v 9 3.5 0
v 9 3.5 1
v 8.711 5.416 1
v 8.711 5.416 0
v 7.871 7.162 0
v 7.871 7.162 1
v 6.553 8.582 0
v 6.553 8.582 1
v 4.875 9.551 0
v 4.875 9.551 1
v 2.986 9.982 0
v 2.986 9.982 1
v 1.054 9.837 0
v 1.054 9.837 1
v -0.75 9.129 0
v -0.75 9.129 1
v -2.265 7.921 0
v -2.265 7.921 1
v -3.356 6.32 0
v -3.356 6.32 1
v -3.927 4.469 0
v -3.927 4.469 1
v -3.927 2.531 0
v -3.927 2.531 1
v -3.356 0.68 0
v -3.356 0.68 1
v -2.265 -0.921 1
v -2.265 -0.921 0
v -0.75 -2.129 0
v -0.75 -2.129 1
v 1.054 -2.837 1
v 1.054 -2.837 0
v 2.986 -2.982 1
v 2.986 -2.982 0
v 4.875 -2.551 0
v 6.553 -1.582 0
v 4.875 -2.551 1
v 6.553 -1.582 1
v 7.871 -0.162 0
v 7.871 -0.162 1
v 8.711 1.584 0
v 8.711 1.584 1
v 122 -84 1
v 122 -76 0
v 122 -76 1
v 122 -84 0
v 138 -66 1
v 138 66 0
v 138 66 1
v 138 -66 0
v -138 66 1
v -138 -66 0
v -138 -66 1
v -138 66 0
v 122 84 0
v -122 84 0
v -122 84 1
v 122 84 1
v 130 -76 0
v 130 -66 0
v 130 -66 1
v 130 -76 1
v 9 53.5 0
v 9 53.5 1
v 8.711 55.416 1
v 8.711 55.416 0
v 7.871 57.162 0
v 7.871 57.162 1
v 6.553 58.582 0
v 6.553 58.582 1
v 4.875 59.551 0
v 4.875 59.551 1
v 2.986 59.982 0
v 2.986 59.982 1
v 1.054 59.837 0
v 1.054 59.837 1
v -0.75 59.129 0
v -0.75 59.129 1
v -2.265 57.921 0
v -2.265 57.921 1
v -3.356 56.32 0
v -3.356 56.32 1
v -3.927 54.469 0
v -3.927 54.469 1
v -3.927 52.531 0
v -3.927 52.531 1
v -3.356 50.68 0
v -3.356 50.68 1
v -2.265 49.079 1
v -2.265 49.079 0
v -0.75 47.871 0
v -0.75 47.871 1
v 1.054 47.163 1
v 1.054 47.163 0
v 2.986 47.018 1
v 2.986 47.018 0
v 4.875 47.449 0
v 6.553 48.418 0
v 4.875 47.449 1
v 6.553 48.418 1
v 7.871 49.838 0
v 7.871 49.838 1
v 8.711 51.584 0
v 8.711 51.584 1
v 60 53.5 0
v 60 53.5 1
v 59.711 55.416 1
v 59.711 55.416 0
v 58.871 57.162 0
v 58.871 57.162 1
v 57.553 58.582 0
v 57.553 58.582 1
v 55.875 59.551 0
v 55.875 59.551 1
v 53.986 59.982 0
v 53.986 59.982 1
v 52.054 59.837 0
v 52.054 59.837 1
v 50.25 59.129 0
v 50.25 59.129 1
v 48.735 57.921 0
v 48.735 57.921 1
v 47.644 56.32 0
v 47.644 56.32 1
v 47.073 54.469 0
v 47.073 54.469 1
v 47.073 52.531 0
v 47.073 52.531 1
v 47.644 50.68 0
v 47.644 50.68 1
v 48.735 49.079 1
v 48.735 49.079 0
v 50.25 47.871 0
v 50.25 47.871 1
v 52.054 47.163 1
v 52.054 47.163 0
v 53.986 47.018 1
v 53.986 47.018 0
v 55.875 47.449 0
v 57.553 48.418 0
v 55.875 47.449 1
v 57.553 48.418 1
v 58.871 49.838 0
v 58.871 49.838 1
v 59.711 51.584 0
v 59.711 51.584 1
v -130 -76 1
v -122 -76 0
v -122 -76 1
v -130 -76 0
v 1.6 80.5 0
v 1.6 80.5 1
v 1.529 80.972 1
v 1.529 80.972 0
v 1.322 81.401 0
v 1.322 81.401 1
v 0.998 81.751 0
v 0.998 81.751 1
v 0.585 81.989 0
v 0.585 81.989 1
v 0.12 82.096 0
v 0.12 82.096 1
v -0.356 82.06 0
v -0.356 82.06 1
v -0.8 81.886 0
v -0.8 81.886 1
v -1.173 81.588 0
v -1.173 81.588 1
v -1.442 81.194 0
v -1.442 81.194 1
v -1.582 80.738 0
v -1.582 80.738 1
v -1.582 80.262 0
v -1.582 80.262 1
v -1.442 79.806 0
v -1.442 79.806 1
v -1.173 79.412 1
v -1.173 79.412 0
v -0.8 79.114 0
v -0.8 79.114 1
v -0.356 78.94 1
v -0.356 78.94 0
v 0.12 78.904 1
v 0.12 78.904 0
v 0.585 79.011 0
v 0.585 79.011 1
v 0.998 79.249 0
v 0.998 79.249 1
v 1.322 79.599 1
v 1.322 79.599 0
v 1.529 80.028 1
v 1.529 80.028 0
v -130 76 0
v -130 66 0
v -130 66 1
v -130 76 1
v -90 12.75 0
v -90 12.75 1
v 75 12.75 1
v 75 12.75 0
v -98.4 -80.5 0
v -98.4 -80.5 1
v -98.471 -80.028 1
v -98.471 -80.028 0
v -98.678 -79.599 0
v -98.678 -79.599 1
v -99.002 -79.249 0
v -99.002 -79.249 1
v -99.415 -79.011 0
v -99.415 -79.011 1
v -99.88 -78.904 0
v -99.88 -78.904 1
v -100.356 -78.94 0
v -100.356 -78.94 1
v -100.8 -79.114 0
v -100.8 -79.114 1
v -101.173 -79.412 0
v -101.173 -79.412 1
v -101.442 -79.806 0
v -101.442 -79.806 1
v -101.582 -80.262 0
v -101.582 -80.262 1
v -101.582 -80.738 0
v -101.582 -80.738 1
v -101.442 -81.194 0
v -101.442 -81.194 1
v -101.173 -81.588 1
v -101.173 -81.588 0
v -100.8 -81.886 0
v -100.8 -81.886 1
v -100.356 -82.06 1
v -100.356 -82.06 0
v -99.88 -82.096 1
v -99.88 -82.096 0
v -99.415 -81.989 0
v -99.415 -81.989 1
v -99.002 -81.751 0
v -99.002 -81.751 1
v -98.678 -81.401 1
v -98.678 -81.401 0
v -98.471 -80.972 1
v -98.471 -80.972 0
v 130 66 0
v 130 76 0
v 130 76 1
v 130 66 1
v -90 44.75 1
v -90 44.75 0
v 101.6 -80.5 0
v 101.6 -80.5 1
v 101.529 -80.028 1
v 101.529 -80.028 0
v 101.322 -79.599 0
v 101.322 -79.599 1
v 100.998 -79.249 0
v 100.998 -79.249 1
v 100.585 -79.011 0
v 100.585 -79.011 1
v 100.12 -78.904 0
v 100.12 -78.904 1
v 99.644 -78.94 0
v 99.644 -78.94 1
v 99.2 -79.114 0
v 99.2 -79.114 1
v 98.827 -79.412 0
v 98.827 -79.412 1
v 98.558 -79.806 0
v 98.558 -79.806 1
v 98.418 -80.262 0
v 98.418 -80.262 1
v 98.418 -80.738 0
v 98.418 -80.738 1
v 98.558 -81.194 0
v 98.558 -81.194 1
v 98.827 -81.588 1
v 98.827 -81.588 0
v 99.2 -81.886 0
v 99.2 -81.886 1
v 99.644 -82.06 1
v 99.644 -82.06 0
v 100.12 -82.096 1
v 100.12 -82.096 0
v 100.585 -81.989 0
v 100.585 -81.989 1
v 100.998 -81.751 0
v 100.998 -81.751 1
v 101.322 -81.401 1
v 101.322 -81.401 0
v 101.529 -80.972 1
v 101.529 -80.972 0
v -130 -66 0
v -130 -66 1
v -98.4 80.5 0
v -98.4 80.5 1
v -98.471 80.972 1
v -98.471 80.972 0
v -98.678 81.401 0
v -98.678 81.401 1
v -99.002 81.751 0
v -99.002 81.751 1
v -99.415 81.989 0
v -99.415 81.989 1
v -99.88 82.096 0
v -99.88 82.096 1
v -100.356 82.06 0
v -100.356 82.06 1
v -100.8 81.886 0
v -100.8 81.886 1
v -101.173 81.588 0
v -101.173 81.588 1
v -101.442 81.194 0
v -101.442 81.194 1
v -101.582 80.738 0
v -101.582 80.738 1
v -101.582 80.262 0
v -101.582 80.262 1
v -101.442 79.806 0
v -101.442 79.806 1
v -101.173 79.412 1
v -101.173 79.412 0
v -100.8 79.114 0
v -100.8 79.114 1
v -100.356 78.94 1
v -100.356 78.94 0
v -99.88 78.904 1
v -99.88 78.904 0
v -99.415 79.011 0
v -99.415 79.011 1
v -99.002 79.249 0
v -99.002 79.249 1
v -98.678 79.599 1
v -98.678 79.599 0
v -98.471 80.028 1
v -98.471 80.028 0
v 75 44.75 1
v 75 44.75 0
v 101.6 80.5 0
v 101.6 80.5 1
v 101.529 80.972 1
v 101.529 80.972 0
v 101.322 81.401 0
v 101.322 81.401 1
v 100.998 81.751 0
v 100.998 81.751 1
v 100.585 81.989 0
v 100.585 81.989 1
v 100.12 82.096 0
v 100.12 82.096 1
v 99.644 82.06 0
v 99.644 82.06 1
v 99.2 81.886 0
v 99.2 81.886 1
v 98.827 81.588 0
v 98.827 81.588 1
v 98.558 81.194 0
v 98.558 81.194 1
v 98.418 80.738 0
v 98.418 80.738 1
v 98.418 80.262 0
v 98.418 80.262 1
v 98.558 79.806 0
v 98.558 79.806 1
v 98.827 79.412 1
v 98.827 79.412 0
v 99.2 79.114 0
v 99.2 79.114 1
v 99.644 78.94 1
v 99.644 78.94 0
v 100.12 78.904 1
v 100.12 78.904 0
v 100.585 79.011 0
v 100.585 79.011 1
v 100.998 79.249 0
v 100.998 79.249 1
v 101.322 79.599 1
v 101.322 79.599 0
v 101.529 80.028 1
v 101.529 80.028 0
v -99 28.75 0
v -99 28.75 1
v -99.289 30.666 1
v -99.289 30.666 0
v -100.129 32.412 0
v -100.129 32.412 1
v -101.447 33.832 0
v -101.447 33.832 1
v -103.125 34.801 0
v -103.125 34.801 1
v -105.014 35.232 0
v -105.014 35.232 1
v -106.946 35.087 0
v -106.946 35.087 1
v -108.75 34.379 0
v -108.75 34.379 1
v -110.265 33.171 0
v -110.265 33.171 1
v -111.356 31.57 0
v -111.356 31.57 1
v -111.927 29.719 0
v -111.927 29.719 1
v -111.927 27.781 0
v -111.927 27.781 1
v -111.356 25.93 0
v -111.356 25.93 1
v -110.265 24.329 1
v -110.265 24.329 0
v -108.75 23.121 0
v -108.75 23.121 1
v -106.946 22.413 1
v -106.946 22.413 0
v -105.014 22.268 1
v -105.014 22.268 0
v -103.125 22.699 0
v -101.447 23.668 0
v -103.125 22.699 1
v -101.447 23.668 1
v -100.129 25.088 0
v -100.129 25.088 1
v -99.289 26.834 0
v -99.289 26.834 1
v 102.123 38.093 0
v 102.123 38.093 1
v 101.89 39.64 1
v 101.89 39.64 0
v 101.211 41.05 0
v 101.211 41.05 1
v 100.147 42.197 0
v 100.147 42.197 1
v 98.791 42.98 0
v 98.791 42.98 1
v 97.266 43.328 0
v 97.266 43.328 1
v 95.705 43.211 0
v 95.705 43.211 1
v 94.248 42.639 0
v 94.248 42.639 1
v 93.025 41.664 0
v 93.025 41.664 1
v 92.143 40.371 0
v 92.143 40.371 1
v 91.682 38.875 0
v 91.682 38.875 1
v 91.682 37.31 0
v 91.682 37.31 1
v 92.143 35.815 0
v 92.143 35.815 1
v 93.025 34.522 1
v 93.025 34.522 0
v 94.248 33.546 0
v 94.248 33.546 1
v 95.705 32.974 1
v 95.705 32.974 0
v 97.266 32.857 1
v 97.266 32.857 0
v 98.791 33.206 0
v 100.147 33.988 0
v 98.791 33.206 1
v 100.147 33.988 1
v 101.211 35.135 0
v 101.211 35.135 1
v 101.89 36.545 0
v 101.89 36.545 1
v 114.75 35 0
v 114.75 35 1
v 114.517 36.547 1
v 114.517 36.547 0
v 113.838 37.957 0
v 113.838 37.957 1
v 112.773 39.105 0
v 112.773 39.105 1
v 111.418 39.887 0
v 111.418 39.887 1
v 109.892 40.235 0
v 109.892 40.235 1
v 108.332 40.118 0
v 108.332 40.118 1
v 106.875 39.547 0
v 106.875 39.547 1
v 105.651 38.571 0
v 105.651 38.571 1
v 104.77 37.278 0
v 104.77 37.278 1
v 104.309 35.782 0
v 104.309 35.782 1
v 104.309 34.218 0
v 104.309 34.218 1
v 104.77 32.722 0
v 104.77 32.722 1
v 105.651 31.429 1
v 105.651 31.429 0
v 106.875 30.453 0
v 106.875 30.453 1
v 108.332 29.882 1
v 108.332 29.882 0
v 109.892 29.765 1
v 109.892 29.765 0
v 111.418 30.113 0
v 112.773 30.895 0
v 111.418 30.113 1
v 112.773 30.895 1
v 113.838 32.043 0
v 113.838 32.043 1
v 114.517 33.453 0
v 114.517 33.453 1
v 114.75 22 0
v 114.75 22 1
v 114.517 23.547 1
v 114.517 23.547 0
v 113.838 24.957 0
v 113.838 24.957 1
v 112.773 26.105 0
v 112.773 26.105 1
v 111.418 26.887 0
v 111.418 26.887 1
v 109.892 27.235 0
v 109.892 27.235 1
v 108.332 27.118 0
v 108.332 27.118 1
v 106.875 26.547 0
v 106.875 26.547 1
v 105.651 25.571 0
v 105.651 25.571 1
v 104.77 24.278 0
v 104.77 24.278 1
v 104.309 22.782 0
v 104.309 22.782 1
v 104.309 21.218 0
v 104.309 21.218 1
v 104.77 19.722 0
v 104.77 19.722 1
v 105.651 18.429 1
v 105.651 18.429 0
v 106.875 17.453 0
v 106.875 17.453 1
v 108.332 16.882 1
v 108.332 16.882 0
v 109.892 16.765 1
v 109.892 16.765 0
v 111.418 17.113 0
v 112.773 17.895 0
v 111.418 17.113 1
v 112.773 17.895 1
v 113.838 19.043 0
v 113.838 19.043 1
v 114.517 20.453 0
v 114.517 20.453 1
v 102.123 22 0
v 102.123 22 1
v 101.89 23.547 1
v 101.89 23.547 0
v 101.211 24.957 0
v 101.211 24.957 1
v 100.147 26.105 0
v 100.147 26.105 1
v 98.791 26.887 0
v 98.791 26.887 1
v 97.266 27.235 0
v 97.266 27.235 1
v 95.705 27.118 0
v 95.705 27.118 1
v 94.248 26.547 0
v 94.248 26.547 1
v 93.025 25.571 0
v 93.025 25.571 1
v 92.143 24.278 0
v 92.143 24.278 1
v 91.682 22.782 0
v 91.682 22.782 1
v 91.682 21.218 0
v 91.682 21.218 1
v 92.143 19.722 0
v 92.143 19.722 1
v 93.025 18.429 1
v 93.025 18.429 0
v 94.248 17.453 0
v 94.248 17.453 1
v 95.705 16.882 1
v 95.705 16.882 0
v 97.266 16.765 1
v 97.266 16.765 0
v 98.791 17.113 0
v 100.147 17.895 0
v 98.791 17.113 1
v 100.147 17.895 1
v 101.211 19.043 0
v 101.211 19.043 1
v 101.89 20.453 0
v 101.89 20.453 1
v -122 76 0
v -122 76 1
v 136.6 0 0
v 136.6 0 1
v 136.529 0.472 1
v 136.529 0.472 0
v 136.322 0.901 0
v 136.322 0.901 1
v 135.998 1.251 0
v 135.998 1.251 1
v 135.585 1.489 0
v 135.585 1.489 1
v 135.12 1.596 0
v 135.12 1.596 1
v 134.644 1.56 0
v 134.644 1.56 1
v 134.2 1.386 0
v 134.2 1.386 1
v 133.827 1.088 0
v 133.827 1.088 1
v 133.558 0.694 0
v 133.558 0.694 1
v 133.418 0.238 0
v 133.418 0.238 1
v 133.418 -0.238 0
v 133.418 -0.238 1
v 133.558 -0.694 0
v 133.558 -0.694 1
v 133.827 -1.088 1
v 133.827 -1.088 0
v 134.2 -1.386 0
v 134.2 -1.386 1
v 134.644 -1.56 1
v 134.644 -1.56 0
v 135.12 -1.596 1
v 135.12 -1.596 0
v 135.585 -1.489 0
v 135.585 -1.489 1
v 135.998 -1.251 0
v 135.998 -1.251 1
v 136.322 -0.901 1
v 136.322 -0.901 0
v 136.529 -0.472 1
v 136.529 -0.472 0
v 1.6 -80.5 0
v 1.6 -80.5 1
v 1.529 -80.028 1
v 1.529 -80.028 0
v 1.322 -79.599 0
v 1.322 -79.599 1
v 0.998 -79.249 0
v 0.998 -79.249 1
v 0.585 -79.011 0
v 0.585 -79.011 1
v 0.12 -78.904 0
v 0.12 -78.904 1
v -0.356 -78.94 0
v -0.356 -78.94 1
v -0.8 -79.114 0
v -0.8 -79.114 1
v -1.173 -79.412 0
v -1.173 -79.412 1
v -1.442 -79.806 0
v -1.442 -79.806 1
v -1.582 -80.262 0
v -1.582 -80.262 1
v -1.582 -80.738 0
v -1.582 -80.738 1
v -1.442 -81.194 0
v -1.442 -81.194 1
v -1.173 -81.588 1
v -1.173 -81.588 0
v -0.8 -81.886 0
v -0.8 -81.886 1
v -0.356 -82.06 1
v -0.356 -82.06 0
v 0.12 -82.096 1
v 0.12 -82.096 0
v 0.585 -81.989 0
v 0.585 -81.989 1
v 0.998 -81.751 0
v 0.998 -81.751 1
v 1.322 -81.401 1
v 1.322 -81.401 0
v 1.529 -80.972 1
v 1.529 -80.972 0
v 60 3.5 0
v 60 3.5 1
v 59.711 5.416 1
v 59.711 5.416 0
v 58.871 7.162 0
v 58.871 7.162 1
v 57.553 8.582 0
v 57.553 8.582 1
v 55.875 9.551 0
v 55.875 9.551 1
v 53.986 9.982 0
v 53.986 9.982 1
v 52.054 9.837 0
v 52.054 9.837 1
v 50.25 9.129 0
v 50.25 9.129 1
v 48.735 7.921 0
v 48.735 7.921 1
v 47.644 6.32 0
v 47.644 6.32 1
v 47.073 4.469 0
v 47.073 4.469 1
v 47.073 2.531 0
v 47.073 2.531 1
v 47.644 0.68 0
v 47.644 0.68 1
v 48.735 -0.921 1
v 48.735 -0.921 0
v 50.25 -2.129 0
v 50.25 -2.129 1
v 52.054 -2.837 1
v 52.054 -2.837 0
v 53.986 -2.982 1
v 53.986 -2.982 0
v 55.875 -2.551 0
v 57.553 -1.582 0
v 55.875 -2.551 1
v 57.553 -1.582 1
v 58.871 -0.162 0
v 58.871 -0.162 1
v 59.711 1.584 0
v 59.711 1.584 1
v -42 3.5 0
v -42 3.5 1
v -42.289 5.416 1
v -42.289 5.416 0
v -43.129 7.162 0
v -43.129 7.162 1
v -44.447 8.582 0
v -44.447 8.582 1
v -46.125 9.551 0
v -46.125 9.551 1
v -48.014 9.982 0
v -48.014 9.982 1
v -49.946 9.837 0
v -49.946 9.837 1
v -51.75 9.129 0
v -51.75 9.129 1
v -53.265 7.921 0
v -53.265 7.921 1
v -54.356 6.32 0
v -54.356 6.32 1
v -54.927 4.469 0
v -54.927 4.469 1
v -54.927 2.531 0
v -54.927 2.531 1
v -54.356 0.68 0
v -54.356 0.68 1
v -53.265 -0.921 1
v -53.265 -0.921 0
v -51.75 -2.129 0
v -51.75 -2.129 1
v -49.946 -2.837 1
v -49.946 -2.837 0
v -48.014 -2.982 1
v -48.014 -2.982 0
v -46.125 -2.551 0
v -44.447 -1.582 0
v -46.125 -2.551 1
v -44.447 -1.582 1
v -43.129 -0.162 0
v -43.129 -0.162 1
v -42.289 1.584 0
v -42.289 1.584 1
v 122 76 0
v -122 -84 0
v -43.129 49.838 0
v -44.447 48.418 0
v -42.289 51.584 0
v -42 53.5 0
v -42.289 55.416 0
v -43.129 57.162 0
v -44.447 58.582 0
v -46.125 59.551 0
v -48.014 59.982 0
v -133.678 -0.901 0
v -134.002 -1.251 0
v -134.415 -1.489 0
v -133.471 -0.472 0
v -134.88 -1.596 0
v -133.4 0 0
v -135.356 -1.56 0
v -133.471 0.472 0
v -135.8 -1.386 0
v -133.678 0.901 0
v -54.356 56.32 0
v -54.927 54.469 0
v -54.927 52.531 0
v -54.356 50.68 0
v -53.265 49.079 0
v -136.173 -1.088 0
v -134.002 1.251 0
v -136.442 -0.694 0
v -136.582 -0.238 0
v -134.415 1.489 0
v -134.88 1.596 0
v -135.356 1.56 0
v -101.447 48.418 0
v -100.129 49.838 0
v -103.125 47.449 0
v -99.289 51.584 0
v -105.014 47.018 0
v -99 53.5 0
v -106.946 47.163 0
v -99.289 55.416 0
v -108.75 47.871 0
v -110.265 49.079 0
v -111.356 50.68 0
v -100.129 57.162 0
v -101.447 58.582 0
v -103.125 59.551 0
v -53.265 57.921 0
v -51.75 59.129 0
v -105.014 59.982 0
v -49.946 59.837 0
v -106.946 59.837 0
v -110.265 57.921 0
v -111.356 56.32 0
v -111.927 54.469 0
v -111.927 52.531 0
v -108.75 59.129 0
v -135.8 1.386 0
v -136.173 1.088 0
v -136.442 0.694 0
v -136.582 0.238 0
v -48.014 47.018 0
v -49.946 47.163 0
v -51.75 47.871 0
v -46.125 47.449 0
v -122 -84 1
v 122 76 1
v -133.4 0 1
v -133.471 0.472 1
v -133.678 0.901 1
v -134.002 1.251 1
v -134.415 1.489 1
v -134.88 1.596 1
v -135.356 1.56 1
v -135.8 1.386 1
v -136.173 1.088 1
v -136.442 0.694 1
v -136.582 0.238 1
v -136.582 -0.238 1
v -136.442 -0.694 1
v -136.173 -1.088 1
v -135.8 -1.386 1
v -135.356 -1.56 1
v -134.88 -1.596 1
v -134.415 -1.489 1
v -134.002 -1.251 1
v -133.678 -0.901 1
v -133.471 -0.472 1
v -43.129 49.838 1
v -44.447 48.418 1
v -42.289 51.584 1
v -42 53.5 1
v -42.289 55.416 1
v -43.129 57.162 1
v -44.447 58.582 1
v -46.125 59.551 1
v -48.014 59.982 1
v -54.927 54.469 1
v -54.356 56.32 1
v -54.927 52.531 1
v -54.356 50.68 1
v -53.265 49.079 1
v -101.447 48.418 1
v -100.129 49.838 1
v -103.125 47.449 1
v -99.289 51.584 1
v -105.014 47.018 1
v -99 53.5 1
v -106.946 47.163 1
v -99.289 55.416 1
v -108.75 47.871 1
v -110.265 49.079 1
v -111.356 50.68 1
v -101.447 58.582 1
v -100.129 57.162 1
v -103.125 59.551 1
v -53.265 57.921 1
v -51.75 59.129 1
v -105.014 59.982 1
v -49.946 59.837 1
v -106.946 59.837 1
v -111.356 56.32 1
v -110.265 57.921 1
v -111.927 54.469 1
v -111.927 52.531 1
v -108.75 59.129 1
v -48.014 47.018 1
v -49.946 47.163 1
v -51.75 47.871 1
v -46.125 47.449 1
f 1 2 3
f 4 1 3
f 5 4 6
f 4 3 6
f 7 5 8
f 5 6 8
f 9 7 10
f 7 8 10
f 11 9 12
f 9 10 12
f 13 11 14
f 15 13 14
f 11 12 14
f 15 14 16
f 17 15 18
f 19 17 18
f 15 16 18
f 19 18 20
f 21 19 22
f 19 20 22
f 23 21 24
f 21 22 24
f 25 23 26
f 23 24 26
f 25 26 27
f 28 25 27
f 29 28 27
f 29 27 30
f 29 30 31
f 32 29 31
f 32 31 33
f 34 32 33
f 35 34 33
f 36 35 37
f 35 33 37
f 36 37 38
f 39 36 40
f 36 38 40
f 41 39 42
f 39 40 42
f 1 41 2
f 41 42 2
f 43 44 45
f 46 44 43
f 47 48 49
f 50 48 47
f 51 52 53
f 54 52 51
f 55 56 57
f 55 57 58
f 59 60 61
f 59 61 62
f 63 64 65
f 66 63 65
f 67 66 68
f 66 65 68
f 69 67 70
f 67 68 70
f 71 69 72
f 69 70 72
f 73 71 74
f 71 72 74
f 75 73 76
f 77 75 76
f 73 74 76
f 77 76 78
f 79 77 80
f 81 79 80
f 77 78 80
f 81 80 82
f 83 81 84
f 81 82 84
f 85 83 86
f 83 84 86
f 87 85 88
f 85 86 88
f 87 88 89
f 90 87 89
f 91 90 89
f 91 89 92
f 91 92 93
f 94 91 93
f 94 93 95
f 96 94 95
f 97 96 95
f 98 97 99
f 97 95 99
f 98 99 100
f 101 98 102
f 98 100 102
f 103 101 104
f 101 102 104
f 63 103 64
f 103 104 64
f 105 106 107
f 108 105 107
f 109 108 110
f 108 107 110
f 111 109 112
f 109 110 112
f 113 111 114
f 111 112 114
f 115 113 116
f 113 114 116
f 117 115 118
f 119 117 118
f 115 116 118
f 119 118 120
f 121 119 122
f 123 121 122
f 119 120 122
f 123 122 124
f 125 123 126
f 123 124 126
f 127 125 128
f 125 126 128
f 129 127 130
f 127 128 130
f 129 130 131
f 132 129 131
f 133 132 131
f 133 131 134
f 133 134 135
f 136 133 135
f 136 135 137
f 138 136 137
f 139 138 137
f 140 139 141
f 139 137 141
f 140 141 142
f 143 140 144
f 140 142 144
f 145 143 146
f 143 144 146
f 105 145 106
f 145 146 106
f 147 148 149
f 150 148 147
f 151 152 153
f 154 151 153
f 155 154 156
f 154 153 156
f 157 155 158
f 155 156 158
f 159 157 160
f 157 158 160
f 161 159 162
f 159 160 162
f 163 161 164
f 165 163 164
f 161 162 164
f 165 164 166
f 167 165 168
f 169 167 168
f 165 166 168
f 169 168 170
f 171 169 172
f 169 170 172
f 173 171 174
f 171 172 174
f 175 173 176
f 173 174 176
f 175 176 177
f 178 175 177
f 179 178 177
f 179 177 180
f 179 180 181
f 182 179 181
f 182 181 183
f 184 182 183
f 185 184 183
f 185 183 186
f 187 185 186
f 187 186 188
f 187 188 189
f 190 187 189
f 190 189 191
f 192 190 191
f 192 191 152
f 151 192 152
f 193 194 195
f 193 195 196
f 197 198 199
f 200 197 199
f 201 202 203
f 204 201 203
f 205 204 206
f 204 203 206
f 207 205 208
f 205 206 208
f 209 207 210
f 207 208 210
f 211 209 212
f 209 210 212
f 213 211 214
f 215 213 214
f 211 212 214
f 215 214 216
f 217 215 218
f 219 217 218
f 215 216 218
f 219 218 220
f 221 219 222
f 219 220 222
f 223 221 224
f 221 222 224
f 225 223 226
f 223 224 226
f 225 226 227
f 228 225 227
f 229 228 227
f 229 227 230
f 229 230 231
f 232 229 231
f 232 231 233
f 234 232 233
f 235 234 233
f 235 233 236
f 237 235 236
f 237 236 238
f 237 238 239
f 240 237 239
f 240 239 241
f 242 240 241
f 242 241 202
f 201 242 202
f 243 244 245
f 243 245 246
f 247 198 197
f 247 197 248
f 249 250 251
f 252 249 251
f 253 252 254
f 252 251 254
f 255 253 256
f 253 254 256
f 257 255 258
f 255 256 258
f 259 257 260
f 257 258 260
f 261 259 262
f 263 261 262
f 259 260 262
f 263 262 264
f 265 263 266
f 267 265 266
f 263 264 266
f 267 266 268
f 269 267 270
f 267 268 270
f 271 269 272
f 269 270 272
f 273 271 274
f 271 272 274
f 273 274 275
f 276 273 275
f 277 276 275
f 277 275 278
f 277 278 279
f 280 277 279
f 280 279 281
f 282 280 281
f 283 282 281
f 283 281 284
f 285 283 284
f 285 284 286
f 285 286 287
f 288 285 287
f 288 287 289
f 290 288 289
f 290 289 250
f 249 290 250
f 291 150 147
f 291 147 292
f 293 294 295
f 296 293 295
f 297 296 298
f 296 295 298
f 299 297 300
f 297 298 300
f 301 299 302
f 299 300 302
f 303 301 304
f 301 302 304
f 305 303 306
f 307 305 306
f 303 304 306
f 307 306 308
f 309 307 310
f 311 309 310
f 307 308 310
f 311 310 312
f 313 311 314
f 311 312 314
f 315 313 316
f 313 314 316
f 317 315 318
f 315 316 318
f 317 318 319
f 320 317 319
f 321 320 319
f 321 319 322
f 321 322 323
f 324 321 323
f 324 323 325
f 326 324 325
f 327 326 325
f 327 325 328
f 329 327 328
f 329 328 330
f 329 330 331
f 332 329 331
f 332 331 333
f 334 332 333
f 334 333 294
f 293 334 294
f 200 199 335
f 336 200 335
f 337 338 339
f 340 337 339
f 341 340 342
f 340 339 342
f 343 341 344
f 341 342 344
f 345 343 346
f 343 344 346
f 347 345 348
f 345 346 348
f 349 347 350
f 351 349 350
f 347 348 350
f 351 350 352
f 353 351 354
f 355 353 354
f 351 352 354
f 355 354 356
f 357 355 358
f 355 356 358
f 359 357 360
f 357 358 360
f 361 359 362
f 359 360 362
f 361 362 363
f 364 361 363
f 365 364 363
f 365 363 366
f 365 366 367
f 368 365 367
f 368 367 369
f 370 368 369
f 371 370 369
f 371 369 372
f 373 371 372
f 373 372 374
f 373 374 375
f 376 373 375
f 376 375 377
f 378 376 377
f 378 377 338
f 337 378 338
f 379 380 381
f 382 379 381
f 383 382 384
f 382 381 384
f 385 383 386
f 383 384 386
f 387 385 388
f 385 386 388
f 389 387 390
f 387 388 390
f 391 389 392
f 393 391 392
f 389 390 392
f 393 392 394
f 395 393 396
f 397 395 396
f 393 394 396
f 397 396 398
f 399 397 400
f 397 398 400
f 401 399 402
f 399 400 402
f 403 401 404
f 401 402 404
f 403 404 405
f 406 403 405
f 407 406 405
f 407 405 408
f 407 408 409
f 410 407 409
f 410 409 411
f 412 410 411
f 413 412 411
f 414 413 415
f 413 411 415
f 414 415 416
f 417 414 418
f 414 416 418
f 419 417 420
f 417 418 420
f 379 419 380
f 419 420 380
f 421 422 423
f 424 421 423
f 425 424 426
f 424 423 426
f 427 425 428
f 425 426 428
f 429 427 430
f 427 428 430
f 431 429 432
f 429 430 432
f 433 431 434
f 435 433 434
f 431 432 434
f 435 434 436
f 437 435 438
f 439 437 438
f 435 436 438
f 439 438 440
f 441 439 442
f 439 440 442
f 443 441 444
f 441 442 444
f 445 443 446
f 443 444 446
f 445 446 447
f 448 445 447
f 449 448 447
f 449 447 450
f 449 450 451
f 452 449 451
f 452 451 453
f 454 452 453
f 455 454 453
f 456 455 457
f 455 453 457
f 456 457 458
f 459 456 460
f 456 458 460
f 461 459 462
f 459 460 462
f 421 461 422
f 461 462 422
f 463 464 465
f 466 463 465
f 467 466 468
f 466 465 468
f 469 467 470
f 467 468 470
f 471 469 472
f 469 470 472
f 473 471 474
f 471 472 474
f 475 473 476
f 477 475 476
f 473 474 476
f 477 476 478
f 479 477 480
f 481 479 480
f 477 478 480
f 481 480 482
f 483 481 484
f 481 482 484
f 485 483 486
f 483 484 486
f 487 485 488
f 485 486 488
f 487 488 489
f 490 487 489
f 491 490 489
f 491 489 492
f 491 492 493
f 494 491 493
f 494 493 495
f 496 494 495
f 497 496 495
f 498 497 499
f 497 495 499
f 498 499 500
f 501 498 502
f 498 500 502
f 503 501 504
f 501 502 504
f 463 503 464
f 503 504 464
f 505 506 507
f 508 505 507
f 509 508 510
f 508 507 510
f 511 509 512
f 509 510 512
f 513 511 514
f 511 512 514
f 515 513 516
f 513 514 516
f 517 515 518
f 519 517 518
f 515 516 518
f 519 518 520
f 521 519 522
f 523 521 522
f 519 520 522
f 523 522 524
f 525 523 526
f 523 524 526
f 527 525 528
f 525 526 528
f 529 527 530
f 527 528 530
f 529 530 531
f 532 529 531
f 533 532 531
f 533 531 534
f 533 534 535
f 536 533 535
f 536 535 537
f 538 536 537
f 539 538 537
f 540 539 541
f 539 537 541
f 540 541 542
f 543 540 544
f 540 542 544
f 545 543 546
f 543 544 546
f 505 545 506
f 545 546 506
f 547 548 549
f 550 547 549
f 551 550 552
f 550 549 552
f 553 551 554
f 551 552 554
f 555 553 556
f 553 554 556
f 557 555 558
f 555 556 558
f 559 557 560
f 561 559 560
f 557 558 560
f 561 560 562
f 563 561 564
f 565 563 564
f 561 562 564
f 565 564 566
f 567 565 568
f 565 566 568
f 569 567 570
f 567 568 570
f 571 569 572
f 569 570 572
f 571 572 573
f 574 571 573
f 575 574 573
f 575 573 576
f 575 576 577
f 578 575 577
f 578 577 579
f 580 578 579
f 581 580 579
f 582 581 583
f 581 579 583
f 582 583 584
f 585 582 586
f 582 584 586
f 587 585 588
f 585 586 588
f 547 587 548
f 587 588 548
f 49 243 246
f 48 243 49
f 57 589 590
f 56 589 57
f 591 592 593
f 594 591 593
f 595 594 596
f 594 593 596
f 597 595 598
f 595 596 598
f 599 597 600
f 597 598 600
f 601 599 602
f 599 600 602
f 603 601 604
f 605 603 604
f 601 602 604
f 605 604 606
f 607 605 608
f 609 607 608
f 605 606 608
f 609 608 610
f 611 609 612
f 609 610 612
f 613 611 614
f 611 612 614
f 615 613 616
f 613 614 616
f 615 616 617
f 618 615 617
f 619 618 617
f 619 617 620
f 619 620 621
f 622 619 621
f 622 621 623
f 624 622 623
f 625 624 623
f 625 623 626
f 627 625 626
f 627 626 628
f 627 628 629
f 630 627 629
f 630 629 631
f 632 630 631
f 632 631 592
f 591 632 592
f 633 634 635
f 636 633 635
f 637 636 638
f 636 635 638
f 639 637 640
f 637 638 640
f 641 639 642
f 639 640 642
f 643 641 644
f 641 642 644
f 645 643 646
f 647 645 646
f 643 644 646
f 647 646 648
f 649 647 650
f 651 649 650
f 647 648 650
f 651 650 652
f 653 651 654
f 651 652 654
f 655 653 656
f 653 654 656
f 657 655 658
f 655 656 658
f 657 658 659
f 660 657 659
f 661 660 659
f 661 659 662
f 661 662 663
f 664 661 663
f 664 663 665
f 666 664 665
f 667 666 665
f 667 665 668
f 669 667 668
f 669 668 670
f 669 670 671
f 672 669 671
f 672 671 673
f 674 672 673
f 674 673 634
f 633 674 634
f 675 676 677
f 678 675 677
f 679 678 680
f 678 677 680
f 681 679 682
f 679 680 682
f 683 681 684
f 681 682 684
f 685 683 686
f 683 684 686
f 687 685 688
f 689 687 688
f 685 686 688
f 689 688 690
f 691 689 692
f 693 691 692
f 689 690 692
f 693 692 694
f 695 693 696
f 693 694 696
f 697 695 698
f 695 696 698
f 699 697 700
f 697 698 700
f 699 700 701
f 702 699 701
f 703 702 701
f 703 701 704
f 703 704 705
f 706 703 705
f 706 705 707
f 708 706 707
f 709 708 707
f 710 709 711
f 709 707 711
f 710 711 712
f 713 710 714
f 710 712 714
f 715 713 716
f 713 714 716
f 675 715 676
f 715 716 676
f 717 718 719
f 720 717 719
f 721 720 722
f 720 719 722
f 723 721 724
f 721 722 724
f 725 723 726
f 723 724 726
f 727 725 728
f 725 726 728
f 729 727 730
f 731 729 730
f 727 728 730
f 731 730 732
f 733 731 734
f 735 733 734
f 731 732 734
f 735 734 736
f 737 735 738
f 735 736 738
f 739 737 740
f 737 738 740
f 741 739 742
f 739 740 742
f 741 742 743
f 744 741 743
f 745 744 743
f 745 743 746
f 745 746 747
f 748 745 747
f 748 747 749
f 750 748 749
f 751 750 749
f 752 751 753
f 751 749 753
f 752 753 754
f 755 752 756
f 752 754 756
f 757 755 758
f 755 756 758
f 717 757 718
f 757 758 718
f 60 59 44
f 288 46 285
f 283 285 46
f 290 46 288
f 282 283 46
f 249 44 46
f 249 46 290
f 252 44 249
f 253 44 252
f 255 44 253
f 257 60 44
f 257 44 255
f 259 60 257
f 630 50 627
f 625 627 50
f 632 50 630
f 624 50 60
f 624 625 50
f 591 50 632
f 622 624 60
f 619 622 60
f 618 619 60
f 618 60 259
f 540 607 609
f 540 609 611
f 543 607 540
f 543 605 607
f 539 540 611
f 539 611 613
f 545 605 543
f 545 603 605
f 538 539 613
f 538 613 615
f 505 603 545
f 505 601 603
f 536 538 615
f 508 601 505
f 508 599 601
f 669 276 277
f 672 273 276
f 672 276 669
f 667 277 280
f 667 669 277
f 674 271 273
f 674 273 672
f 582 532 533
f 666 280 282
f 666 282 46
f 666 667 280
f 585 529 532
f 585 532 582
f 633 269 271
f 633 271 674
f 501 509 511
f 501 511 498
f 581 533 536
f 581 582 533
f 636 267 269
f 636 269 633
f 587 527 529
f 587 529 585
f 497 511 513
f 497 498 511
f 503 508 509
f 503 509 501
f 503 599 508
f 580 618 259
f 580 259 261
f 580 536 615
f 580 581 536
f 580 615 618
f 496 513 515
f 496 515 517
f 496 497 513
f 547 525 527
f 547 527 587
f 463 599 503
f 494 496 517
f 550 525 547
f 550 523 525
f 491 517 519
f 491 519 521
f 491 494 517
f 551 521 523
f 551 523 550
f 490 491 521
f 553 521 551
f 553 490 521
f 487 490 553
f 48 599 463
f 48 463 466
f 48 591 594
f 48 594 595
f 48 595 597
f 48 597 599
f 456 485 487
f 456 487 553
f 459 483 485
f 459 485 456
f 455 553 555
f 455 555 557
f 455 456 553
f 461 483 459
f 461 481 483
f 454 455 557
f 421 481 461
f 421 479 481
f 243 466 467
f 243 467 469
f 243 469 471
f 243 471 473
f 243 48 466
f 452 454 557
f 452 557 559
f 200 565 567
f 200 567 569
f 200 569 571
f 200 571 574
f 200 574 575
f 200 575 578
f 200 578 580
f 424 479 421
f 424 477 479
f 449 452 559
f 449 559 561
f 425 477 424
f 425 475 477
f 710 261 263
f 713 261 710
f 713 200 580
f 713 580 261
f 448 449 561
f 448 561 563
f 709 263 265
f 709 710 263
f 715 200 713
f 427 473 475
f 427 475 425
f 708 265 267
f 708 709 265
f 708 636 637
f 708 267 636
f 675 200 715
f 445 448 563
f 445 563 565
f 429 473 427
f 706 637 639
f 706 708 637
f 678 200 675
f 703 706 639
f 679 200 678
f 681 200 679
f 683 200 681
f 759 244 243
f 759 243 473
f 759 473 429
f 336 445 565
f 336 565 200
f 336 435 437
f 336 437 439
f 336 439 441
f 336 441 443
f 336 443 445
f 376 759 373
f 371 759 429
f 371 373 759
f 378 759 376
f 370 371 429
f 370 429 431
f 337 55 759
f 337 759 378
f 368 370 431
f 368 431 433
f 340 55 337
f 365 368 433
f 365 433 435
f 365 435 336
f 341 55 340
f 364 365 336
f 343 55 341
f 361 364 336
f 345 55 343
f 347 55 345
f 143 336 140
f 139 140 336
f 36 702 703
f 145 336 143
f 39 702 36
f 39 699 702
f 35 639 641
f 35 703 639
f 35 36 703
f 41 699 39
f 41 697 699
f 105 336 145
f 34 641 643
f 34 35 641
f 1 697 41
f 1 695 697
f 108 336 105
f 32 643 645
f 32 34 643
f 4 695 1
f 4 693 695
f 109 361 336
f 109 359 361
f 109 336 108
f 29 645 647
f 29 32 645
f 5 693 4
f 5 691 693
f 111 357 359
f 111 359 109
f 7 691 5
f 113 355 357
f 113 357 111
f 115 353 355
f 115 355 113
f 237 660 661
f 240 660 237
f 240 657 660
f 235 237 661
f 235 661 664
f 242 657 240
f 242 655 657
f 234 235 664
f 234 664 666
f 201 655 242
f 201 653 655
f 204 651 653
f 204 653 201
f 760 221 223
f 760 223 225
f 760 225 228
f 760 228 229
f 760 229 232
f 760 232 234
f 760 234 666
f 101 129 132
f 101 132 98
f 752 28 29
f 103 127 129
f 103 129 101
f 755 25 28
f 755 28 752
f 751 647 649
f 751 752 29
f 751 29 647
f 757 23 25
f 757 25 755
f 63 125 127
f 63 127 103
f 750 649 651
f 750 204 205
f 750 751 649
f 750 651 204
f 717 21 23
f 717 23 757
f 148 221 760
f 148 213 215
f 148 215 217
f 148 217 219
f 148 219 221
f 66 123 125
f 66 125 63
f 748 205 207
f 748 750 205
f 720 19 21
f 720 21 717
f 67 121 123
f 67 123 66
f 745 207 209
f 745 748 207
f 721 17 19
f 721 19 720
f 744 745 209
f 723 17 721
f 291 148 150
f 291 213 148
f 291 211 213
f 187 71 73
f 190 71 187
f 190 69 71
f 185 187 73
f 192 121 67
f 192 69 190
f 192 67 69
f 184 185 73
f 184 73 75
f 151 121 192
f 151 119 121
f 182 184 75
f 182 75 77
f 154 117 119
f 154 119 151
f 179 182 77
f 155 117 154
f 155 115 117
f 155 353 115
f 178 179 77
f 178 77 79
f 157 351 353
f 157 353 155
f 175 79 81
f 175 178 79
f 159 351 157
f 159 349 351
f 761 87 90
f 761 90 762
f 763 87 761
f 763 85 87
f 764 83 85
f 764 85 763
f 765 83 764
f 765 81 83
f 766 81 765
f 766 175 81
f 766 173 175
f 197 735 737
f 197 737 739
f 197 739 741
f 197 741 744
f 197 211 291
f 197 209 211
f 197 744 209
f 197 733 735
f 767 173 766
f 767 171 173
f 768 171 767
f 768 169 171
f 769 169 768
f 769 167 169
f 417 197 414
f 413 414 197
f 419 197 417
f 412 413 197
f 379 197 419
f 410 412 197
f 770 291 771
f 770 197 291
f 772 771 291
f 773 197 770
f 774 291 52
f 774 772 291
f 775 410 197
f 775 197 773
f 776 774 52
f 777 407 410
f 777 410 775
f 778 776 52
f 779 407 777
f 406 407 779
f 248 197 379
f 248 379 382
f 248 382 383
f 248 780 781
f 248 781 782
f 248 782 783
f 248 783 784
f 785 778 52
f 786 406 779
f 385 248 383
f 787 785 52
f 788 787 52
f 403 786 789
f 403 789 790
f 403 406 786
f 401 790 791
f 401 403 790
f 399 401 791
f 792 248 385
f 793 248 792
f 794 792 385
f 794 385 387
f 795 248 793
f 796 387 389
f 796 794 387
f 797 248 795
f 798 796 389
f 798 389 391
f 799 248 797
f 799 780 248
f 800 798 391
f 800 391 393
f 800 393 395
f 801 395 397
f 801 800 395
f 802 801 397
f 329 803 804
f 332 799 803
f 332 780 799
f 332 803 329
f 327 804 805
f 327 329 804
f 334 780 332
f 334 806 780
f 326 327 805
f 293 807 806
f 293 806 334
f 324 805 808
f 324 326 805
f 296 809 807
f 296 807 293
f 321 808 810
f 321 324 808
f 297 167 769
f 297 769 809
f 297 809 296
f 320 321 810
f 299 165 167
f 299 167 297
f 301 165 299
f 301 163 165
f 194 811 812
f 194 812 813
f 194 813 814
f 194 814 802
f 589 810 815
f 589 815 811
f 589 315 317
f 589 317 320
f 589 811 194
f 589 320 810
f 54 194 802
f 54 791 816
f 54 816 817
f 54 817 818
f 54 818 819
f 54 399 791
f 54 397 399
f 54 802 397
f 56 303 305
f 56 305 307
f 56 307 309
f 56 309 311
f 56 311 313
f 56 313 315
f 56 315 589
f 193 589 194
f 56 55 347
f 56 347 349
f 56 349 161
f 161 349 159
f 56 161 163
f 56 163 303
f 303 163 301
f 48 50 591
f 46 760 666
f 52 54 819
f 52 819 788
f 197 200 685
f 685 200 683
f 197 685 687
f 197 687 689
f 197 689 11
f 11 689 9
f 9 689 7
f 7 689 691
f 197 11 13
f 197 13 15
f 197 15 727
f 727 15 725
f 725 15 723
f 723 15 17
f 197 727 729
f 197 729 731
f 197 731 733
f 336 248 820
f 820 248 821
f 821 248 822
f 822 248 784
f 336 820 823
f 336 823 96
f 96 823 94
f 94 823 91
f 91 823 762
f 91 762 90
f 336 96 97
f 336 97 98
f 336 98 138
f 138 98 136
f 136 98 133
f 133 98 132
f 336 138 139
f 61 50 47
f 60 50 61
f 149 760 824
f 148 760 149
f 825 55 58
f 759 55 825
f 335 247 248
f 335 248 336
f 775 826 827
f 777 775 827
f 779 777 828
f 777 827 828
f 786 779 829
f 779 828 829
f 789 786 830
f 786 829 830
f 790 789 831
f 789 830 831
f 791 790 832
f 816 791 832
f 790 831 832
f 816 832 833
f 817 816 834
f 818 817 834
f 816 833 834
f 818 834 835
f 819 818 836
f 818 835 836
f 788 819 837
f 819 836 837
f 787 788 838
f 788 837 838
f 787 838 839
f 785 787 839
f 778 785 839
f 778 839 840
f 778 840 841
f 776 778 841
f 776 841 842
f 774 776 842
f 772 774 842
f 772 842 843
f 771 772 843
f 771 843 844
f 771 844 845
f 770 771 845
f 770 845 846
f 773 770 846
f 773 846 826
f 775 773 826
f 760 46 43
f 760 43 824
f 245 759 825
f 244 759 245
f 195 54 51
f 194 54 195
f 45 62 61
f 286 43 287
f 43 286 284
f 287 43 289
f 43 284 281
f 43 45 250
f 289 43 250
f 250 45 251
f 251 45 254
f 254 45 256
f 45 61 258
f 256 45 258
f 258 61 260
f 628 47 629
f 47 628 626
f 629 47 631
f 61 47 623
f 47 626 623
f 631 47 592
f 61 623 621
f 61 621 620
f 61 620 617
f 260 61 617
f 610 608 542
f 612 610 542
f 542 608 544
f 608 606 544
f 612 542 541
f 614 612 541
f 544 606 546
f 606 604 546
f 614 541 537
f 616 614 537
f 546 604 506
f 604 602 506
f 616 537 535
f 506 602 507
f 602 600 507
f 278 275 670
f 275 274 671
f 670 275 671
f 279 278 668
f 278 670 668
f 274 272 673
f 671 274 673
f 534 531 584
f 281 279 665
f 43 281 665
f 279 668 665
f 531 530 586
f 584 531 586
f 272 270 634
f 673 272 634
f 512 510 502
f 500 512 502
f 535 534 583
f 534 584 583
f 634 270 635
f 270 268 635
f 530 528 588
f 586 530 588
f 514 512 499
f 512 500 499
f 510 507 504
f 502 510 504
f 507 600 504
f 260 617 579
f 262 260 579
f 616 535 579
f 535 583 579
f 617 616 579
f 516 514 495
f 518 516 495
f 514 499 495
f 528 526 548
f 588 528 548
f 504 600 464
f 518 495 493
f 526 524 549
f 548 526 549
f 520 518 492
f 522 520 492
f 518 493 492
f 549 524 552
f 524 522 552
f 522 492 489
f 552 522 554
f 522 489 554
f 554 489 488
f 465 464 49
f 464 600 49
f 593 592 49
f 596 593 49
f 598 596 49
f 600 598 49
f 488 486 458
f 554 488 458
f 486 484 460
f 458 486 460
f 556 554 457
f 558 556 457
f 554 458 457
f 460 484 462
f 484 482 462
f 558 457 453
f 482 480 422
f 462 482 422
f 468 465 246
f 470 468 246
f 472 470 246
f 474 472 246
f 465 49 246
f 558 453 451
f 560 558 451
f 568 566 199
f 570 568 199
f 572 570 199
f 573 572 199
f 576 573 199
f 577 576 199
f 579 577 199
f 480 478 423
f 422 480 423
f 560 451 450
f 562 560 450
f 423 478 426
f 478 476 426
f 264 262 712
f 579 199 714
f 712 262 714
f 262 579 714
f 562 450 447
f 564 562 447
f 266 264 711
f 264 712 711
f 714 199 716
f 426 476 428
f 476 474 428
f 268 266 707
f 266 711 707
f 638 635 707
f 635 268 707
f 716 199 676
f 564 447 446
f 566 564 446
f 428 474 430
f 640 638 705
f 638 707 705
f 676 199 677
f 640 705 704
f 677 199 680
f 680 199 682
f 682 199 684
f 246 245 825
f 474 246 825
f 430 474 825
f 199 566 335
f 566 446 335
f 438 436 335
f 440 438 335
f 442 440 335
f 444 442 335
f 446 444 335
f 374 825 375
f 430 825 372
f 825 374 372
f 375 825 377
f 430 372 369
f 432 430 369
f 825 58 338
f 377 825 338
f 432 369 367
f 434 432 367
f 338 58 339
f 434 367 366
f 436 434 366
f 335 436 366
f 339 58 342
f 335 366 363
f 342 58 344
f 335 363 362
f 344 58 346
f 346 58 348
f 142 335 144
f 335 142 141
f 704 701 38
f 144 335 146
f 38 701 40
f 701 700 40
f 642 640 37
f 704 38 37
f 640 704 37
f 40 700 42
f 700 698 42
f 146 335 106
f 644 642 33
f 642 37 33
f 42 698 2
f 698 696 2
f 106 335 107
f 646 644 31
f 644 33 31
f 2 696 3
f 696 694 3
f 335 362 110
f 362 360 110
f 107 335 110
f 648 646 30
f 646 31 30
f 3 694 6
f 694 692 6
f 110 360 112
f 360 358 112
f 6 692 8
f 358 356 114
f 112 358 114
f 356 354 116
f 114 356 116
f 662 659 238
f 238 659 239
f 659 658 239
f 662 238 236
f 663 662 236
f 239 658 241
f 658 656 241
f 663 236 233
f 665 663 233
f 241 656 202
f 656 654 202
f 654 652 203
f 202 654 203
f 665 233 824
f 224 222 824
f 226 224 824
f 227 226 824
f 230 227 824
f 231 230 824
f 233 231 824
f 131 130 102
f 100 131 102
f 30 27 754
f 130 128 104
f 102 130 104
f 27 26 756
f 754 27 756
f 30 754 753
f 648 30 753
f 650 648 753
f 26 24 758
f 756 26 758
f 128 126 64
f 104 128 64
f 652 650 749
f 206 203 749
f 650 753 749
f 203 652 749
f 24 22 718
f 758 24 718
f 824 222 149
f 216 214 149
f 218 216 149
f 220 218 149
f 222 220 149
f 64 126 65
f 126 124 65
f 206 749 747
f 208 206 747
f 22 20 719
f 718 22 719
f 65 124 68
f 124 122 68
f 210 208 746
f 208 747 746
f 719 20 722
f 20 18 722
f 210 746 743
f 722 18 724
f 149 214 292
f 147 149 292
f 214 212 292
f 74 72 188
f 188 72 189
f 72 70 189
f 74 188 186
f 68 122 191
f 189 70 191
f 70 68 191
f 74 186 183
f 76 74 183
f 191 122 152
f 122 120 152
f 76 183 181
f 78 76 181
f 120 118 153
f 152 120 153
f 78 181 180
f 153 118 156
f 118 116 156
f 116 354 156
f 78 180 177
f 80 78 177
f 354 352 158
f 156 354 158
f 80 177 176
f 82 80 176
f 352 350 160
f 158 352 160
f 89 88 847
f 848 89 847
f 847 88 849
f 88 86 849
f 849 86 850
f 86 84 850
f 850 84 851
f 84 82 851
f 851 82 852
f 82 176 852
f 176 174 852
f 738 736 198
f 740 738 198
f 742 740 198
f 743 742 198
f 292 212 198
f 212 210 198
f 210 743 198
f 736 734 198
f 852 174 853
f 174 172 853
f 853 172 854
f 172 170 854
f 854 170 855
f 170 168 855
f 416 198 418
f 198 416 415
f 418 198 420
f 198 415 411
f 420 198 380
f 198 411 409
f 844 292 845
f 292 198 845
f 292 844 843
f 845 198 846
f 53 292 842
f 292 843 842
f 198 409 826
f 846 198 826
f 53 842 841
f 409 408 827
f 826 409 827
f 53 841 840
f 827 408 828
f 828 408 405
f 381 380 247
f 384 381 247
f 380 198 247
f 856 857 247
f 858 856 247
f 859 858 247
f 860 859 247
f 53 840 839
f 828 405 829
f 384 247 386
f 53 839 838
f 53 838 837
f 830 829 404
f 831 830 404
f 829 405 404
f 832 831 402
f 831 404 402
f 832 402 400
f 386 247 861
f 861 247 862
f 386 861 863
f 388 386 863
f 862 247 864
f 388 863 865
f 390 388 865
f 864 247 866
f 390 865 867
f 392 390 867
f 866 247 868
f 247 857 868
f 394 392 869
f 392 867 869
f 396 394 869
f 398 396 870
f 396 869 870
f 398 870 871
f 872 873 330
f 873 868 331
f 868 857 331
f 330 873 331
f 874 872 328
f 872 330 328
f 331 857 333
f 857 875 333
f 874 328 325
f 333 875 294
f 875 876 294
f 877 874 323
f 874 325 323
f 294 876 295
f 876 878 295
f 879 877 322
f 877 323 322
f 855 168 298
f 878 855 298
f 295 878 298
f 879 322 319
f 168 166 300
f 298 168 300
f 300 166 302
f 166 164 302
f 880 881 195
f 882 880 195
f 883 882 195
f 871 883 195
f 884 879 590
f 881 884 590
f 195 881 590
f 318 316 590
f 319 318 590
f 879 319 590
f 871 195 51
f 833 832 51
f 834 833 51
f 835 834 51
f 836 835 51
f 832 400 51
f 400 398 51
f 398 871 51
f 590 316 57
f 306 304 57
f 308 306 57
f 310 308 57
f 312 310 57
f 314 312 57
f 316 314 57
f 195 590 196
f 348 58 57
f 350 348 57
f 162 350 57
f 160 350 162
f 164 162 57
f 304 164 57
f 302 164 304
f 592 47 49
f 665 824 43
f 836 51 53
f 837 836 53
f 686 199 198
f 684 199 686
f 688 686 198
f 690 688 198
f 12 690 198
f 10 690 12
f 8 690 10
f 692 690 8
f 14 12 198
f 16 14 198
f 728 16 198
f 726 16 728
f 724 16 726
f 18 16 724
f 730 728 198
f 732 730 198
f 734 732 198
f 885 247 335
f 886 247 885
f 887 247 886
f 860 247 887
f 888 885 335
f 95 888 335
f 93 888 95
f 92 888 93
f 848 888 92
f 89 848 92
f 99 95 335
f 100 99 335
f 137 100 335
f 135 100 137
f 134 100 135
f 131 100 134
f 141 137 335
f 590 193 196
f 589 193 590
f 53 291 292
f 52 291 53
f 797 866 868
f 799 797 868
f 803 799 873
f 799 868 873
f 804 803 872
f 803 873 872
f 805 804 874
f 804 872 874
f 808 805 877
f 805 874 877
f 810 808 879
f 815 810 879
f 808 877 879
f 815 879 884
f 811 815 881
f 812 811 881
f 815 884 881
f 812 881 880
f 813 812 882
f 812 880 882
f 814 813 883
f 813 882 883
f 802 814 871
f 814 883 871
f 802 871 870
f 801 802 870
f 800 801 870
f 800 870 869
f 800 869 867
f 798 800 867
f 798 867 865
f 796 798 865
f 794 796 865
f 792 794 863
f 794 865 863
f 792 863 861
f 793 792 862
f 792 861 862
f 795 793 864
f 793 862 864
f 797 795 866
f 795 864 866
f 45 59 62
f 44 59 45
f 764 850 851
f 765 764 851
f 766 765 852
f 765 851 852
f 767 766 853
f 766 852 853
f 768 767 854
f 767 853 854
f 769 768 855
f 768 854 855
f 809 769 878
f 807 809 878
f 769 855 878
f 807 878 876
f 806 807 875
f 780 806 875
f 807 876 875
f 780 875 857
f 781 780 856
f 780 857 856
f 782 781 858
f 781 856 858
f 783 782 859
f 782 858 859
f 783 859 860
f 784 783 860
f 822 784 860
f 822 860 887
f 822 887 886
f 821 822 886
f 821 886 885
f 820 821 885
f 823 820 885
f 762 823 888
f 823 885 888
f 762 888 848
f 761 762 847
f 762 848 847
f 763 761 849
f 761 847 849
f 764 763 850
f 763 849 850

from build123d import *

# Parameters (mm, degrees)
EXTRUDE1_DEPTH        = 1
SKETCH2_W             = 165
SKETCH2_H             = 32
CUT_EXTRUDE1_DEPTH    = 1
SKETCH3_R             = 6.5
SKETCH3_R_2           = 5.25
CUT_EXTRUDE2_DEPTH    = 1
ESBO_O1_R             = 1.6
CORTE_EXTRUS_O1_DEPTH = 2


with BuildPart() as part:
    # Sketch1 → Extrude1 (new body)
    with BuildSketch(Plane.XY):
        Polygon((-122, 84), (122, 84), (122, 76), (130, 76), (130, 66), (138, 66), (138, -66), (130, -66), (130, -76), (122, -76), (122, -84), (-122, -84), (-122, -76), (-130, -76), (-130, -66), (-138, -66), (-138, 66), (-130, 66), (-130, 76), (-122, 76), align=None)
    extrude(amount=EXTRUDE1_DEPTH)

    # Sketch2 → Cut-Extrude1 (cut)
    with BuildSketch(Plane.XY.offset(1)):
        with Locations((-7.5, 28.75)):
            Rectangle(SKETCH2_W, SKETCH2_H)
    extrude(amount=-CUT_EXTRUDE1_DEPTH, mode=Mode.SUBTRACT)

    # Sketch3 → Cut-Extrude2 (cut)
    with BuildSketch(Plane.XY.offset(1)):
        with Locations((-105.5, 53.5)):
            Circle(SKETCH3_R)
        with Locations((-105.5, 28.75)):
            Circle(SKETCH3_R)
        with Locations((-48.5, 3.5)):
            Circle(SKETCH3_R)
        with Locations((2.5, 3.5)):
            Circle(SKETCH3_R)
        with Locations((53.5, 3.5)):
            Circle(SKETCH3_R)
        with Locations((53.5, 53.5)):
            Circle(SKETCH3_R)
        with Locations((2.5, 53.5)):
            Circle(SKETCH3_R)
        with Locations((-48.5, 53.5)):
            Circle(SKETCH3_R)
        with Locations((96.873262634, 38.092814818)):
            Circle(SKETCH3_R_2)
        with Locations((109.5, 35)):
            Circle(SKETCH3_R_2)
        with Locations((109.5, 22)):
            Circle(SKETCH3_R_2)
        with Locations((96.873262634, 22)):
            Circle(SKETCH3_R_2)
    extrude(amount=-CUT_EXTRUDE2_DEPTH, mode=Mode.SUBTRACT)

    # Esboço1 → Corte-extrusão1 (cut, through all)
    with BuildSketch(Plane.XY.offset(1)):
        with Locations((0, -80.5)):
            Circle(ESBO_O1_R)
        with Locations((-100, -80.5)):
            Circle(ESBO_O1_R)
        with Locations((100, -80.5)):
            Circle(ESBO_O1_R)
        with Locations((-135, 0)):
            Circle(ESBO_O1_R)
        with Locations((135, 0)):
            Circle(ESBO_O1_R)
        with Locations((100, 80.5)):
            Circle(ESBO_O1_R)
        with Locations((-100, 80.5)):
            Circle(ESBO_O1_R)
        with Locations((0, 80.5)):
            Circle(ESBO_O1_R)
    extrude(amount=-CORTE_EXTRUS_O1_DEPTH, mode=Mode.SUBTRACT)


solid = part.part
